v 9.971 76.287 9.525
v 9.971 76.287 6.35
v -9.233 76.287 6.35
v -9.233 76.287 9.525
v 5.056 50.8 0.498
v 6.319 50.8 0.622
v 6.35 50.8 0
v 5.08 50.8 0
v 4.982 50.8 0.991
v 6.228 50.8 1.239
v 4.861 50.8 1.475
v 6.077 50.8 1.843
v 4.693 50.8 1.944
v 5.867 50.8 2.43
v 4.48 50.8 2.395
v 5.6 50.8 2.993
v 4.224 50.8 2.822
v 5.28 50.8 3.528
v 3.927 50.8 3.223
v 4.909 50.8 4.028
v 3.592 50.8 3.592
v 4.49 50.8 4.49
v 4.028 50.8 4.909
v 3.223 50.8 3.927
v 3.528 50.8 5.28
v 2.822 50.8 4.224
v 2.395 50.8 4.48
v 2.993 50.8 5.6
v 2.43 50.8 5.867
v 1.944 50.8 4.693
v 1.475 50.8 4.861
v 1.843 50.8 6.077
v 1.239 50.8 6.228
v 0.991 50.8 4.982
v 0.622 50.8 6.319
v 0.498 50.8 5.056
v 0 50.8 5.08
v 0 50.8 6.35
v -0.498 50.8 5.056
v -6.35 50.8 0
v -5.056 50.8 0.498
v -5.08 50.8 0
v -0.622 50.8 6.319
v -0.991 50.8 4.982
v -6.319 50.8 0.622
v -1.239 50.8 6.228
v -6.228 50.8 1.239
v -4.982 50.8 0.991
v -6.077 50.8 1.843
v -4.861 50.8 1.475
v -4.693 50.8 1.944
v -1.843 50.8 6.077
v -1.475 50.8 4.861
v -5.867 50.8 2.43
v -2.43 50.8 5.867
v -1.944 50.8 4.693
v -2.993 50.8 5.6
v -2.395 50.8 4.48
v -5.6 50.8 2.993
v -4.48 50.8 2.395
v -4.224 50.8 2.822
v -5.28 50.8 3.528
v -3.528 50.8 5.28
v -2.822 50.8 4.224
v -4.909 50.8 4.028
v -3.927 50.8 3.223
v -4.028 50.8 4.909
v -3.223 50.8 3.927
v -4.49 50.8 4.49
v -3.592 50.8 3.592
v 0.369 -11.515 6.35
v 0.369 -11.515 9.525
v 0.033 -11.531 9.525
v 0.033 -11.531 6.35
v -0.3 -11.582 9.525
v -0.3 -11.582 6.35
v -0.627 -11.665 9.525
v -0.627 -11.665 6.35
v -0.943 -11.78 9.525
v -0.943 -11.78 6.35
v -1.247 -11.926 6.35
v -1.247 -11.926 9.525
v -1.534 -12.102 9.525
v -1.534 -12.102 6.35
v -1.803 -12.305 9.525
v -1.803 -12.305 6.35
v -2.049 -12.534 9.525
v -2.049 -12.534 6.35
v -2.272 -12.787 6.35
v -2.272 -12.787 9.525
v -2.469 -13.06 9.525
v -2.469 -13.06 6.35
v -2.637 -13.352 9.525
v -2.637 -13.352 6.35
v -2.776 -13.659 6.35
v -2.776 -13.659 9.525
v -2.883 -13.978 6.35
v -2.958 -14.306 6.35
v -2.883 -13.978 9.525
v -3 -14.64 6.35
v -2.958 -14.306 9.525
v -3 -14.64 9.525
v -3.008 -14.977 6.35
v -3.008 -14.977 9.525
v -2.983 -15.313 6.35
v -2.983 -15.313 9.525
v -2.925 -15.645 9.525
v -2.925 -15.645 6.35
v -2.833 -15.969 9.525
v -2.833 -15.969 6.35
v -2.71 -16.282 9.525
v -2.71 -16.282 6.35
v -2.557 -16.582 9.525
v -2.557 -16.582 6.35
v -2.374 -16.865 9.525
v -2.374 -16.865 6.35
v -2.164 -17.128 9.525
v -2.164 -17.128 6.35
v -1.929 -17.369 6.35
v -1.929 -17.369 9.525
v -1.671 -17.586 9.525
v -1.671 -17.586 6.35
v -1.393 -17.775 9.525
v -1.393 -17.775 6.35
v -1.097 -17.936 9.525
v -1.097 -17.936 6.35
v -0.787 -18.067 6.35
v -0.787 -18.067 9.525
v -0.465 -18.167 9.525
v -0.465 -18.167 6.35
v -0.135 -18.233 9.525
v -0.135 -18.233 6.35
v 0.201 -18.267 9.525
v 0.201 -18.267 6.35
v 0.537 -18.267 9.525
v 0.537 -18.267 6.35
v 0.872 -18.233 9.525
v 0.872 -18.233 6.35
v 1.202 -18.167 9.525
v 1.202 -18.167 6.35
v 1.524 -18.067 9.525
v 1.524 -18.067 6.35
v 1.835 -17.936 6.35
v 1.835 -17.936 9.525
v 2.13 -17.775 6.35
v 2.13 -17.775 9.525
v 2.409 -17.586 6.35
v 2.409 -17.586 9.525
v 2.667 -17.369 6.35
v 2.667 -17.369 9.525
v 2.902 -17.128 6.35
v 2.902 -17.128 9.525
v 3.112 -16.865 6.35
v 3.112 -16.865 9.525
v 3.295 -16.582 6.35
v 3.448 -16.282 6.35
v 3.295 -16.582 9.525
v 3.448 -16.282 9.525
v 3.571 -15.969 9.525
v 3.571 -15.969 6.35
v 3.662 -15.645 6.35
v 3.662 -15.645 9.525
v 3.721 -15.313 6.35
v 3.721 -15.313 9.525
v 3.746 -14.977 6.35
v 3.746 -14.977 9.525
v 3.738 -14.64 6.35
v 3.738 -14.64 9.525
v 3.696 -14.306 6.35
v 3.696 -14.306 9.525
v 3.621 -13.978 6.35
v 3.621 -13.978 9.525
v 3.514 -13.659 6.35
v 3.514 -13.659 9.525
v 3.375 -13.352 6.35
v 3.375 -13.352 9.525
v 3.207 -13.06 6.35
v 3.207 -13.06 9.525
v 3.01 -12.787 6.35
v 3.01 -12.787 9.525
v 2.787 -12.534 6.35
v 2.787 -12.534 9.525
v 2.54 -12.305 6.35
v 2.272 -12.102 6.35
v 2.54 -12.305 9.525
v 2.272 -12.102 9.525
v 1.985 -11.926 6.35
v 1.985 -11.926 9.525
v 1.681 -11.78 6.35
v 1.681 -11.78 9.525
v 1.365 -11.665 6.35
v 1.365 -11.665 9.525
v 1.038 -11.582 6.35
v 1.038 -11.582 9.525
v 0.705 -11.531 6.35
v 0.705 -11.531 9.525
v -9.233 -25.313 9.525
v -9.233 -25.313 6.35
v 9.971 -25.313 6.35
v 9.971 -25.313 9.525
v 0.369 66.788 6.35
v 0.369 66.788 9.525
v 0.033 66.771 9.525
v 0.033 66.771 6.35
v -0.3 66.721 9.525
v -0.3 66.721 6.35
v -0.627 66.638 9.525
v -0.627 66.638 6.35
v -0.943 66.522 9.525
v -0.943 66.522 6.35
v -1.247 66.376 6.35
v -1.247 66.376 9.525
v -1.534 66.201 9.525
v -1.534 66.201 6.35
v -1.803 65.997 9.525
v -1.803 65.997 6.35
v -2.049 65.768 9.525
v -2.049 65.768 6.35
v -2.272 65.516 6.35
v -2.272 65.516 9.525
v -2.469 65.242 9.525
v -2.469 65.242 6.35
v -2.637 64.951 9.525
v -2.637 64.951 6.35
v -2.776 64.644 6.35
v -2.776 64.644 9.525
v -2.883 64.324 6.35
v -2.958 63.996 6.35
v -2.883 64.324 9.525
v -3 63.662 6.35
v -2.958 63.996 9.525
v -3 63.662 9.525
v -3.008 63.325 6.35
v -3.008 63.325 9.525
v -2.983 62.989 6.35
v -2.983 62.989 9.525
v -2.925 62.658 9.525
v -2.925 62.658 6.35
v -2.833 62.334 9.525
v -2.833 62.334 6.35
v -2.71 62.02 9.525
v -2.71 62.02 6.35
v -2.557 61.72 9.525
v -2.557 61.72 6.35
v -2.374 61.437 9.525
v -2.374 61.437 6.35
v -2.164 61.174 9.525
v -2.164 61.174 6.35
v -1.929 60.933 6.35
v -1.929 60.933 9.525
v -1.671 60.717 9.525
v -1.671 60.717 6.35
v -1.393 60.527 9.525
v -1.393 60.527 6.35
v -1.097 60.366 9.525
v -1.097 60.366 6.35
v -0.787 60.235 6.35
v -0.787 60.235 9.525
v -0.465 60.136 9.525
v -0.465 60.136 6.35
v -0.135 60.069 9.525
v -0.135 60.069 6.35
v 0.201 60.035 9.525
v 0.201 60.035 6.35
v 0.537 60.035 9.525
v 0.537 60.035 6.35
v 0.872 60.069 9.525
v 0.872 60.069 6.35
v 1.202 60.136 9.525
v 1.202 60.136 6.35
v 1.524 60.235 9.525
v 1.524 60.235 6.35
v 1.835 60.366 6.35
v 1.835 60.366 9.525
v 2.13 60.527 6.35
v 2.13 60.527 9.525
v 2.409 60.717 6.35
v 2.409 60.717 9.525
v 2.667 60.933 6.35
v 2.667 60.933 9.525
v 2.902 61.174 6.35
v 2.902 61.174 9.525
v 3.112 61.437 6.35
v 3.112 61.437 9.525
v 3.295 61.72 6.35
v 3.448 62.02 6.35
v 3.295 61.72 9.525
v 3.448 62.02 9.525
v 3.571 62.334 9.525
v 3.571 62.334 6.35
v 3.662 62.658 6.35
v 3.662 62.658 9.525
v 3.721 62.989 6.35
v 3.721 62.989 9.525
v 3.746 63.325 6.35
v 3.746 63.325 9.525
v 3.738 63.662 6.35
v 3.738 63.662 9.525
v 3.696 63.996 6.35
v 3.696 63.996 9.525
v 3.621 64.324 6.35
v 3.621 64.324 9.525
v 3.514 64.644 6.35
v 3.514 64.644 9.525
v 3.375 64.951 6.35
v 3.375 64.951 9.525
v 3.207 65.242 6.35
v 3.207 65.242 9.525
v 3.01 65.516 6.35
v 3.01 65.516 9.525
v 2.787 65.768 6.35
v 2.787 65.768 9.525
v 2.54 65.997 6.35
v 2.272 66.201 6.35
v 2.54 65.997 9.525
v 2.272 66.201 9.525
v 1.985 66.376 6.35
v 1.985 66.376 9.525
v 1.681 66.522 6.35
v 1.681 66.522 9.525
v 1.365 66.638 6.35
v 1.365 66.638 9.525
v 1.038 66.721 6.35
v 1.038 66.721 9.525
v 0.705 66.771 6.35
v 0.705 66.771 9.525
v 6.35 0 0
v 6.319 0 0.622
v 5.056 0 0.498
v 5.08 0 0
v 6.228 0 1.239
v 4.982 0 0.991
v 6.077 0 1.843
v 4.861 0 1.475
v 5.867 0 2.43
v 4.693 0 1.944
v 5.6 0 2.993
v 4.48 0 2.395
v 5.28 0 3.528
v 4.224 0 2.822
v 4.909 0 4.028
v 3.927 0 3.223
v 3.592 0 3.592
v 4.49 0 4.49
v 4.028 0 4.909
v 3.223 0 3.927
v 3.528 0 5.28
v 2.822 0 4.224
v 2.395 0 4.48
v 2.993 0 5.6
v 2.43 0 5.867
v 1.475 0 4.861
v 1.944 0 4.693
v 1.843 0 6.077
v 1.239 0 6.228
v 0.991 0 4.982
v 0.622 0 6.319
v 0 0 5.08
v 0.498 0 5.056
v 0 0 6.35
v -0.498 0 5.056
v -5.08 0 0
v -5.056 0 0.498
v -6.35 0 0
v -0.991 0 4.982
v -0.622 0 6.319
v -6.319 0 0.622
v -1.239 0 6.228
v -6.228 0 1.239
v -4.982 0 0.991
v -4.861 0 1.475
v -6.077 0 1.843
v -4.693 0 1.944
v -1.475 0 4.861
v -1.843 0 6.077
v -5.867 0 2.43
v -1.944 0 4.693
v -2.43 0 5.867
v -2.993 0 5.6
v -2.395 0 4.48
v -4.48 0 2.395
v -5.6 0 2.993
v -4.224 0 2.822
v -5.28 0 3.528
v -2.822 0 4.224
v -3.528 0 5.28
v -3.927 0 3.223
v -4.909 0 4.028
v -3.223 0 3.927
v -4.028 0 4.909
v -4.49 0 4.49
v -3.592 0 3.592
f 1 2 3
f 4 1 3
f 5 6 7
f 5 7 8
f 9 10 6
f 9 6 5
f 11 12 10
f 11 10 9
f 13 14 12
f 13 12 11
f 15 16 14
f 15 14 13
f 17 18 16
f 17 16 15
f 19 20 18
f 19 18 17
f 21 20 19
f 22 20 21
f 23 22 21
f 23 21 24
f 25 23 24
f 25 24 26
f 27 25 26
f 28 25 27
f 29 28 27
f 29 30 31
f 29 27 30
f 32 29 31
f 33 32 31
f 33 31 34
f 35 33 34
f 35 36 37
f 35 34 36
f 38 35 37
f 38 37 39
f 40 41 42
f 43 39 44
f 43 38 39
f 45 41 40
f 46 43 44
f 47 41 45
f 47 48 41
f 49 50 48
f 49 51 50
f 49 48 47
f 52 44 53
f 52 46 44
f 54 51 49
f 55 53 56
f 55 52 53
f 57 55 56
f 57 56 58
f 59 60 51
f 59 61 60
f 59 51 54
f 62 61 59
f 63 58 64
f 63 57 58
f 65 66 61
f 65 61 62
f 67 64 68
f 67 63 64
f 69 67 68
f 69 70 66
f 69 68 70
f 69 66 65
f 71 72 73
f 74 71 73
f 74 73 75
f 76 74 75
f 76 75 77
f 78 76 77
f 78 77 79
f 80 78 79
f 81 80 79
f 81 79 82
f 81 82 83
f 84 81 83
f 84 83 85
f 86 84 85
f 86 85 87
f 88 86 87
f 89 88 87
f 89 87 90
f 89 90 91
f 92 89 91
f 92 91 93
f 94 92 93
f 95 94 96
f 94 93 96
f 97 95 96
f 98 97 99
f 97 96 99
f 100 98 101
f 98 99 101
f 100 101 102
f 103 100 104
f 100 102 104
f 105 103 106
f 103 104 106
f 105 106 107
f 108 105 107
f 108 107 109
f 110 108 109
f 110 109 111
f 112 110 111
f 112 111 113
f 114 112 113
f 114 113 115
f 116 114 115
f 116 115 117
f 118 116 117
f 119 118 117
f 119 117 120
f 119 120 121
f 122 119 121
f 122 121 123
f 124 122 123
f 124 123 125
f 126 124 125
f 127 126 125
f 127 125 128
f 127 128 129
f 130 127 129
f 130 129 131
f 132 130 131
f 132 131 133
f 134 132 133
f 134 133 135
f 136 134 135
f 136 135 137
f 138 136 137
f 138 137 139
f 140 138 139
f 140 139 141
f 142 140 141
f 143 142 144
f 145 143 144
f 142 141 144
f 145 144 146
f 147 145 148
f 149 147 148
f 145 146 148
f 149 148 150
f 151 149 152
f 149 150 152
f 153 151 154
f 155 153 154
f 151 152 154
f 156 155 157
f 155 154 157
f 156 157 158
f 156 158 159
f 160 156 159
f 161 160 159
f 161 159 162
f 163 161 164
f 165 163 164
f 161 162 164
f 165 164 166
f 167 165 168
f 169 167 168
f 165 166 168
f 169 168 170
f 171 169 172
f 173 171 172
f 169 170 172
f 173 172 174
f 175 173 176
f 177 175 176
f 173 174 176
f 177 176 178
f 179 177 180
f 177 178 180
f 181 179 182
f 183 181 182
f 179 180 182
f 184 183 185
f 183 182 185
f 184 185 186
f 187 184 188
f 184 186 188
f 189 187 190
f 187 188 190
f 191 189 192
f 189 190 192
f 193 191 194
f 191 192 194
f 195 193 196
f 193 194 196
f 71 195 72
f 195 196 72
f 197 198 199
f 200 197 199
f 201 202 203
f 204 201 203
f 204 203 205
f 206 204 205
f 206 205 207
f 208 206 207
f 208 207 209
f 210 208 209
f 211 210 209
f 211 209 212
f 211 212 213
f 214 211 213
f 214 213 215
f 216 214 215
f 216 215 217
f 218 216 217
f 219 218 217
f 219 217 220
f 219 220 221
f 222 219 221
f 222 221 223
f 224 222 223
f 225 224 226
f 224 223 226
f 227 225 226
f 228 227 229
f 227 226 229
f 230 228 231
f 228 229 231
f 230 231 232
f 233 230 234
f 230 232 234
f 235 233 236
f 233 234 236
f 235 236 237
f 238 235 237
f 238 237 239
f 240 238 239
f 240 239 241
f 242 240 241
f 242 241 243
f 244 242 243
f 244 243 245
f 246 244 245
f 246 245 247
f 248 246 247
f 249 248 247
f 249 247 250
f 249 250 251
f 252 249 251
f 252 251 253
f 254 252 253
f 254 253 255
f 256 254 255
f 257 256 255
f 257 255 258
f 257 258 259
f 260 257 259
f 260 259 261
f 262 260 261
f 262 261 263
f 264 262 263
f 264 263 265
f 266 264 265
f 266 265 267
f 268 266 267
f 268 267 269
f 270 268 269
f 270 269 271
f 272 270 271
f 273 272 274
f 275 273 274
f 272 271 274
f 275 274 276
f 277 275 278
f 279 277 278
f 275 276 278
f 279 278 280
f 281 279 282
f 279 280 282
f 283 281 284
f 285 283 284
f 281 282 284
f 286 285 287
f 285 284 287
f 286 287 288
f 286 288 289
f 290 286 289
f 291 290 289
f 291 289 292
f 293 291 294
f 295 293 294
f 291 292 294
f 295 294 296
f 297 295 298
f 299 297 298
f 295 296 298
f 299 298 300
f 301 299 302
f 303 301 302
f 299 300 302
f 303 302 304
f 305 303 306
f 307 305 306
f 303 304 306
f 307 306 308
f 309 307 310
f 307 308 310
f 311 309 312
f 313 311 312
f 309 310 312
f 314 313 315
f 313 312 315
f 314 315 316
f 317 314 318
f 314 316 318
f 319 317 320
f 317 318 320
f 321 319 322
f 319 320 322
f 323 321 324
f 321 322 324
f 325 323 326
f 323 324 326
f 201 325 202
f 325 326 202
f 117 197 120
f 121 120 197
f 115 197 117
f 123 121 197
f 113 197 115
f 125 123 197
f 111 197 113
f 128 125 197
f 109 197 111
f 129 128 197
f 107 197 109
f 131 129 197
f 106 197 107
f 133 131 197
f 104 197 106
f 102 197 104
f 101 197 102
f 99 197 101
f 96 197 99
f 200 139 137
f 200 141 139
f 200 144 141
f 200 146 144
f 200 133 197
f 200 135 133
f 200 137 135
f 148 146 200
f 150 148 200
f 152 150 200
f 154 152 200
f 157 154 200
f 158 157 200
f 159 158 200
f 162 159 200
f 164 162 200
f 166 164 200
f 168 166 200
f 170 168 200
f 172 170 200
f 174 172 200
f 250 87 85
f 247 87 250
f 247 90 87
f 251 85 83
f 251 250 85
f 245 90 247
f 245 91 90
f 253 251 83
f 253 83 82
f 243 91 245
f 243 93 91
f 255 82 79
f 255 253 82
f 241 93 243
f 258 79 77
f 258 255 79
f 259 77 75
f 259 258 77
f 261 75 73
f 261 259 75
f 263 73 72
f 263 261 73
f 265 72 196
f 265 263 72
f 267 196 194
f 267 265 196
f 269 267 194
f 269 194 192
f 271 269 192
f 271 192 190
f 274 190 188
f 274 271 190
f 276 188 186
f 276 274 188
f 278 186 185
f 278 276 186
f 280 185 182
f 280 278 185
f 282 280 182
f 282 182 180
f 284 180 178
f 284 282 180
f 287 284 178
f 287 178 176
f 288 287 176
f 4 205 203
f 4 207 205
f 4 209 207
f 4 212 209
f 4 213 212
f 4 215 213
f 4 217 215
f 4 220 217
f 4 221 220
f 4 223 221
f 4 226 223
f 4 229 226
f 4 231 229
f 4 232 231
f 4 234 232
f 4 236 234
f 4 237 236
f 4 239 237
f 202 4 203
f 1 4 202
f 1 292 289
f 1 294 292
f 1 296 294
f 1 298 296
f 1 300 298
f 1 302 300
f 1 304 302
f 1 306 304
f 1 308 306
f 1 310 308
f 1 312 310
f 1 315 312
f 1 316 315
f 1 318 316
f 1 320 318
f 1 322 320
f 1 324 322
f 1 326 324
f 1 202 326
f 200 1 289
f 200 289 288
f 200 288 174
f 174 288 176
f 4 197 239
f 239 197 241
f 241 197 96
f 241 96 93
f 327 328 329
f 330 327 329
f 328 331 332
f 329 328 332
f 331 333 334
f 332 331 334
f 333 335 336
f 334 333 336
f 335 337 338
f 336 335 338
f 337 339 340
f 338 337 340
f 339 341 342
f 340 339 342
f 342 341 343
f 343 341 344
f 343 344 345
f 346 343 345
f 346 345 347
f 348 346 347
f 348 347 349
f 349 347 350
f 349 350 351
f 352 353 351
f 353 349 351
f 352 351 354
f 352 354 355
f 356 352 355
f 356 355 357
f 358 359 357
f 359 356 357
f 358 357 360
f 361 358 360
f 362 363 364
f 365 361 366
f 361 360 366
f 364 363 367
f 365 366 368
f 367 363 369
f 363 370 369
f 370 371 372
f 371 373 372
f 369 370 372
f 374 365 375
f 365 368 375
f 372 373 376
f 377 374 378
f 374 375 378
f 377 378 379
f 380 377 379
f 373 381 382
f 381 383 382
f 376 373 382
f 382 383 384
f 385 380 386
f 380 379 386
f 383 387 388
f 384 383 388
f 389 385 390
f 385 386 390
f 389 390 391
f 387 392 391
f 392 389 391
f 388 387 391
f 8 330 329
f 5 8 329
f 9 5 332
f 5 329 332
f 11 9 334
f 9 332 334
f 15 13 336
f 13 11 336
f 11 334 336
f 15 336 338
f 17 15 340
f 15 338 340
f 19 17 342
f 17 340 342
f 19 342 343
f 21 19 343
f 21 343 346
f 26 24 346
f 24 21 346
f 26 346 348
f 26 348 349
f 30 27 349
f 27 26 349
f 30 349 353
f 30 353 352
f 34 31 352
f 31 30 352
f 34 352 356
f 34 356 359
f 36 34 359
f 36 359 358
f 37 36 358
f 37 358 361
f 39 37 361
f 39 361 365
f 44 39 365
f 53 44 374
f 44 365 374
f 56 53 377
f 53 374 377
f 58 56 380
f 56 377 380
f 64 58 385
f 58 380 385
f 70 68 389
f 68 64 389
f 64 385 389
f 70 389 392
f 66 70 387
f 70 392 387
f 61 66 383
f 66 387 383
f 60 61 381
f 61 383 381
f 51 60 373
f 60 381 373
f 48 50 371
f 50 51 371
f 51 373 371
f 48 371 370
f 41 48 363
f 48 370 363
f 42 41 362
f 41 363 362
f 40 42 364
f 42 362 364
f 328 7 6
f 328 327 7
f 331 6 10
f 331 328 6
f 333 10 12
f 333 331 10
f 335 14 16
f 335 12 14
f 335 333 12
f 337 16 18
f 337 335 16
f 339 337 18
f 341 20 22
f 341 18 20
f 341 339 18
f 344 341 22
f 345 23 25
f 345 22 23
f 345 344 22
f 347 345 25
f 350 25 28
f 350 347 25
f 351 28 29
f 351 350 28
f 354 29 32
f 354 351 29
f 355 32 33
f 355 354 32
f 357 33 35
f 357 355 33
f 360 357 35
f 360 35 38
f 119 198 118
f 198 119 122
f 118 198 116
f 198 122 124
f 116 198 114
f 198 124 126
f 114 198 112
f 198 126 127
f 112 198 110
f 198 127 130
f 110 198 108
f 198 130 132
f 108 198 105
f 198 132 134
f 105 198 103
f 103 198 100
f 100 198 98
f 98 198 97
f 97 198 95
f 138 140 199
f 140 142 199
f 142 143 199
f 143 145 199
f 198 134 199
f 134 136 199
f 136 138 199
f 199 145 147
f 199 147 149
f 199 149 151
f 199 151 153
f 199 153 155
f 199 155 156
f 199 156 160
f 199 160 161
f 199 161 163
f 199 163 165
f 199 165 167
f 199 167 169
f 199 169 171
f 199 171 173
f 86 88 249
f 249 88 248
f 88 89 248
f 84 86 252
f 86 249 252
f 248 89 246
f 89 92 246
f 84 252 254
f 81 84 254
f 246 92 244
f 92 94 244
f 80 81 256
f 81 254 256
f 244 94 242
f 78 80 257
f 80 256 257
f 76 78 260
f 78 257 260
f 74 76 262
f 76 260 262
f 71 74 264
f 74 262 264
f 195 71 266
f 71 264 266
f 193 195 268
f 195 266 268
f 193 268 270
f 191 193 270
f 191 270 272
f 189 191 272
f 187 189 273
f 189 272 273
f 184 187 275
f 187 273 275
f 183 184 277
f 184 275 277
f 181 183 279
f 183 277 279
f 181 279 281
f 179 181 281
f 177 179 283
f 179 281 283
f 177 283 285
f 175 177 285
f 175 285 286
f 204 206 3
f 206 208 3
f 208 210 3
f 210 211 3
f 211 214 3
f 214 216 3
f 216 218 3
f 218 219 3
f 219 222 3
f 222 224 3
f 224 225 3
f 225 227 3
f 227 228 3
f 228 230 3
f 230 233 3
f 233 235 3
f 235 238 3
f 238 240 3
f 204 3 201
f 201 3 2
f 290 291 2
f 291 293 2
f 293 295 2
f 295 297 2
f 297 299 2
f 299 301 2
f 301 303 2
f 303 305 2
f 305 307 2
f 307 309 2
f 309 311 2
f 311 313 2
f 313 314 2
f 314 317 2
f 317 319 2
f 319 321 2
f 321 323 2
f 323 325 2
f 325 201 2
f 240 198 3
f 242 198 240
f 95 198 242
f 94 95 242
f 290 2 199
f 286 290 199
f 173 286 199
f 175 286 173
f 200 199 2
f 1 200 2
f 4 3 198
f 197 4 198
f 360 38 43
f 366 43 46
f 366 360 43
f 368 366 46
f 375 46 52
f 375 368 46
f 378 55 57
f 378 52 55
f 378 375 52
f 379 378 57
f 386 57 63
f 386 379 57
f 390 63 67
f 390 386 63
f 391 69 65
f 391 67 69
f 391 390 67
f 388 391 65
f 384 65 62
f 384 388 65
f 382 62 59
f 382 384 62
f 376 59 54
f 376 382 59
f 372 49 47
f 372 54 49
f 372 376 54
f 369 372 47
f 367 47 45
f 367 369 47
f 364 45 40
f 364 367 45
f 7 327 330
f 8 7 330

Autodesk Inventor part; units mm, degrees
ref_plane "YZ Plane" through (0, 0, 0) normal (1, 0, 0) x (0, 1, 0)
ref_plane "XZ Plane" through (0, 0, 0) normal (0, 1, 0) x (-1, 0, 0)
sketch "Sketch1" plane through (0, 0, 0) normal (0, 1, 0) x (-1, 0, 0)
  arc A0 (6.35, 0) -> (-6.35, 0) centre (0, 0) ccw
  arc A1 (5.08, 0) -> (-5.08, 0) centre (0, 0) ccw
  line L0 (-6.35, 0) -> (-5.08, 0)
  line L1 (5.08, 0) -> (6.35, 0)
  dimension "d0" = 12.7
  dimension "d1" = 1.27
extrude "Extrusion1" add sketch "Sketch1" along normal blind 50.8
sketch "Sketch2" plane through (0, 50.8, 0) normal (0, 1, 0) x (1, 0, 0)
  arc A0 (-6.35, 0) -> (6.35, 0) centre (0, 0) ccw projected
  line L0 (6.35, 0) -> (5.08, 0) projected
  arc A1 (-5.08, 0) -> (5.08, 0) centre (0, 0) ccw projected
  line L1 (-5.08, 0) -> (-6.35, 0) projected
  point P0 (0, -6.35)
ref_plane "Work Plane1" through (0, 50.8, 6.35) normal (0, 0, 1) x (1, 0, 0)
sketch "Sketch3" plane through (0, 50.8, 6.35) normal (0, 0, 1) x (1, 0, 0)
  line L0 (-9.2332, -76.1134) -> (9.971, -76.1134)
  line L1 (9.971, -76.1134) -> (9.971, 25.4866)
  line L2 (9.971, 25.4866) -> (-9.2332, 25.4866)
  line L3 (-9.2332, 25.4866) -> (-9.2332, -76.1134)
  point P0 (0, -50.8)
  dimension "d4" = 101.6
extrude "Extrusion2" add sketch "Sketch3" along normal blind 3.175
sketch "Sketch4" plane through (0, 50.8, 6.35) normal (0, 0, -1) x (-1, 0, 0)
  circle A0 centre (-0.3689, 12.6095) radius 2.8969
  circle A1 centre (-0.3689, -65.6928) radius 3.2786
hole "Hole1" at (0.3689, 63.4095, 6.35) at (0.3689, -14.8928, 6.35) direction (0, 0, 1) diameter 6.7564 end through all clearance for "Flat Head Machine Screw (82)" size "1/4" standard "Ansi Unified Screw Threads"
properties part number "feedCableStay1"
